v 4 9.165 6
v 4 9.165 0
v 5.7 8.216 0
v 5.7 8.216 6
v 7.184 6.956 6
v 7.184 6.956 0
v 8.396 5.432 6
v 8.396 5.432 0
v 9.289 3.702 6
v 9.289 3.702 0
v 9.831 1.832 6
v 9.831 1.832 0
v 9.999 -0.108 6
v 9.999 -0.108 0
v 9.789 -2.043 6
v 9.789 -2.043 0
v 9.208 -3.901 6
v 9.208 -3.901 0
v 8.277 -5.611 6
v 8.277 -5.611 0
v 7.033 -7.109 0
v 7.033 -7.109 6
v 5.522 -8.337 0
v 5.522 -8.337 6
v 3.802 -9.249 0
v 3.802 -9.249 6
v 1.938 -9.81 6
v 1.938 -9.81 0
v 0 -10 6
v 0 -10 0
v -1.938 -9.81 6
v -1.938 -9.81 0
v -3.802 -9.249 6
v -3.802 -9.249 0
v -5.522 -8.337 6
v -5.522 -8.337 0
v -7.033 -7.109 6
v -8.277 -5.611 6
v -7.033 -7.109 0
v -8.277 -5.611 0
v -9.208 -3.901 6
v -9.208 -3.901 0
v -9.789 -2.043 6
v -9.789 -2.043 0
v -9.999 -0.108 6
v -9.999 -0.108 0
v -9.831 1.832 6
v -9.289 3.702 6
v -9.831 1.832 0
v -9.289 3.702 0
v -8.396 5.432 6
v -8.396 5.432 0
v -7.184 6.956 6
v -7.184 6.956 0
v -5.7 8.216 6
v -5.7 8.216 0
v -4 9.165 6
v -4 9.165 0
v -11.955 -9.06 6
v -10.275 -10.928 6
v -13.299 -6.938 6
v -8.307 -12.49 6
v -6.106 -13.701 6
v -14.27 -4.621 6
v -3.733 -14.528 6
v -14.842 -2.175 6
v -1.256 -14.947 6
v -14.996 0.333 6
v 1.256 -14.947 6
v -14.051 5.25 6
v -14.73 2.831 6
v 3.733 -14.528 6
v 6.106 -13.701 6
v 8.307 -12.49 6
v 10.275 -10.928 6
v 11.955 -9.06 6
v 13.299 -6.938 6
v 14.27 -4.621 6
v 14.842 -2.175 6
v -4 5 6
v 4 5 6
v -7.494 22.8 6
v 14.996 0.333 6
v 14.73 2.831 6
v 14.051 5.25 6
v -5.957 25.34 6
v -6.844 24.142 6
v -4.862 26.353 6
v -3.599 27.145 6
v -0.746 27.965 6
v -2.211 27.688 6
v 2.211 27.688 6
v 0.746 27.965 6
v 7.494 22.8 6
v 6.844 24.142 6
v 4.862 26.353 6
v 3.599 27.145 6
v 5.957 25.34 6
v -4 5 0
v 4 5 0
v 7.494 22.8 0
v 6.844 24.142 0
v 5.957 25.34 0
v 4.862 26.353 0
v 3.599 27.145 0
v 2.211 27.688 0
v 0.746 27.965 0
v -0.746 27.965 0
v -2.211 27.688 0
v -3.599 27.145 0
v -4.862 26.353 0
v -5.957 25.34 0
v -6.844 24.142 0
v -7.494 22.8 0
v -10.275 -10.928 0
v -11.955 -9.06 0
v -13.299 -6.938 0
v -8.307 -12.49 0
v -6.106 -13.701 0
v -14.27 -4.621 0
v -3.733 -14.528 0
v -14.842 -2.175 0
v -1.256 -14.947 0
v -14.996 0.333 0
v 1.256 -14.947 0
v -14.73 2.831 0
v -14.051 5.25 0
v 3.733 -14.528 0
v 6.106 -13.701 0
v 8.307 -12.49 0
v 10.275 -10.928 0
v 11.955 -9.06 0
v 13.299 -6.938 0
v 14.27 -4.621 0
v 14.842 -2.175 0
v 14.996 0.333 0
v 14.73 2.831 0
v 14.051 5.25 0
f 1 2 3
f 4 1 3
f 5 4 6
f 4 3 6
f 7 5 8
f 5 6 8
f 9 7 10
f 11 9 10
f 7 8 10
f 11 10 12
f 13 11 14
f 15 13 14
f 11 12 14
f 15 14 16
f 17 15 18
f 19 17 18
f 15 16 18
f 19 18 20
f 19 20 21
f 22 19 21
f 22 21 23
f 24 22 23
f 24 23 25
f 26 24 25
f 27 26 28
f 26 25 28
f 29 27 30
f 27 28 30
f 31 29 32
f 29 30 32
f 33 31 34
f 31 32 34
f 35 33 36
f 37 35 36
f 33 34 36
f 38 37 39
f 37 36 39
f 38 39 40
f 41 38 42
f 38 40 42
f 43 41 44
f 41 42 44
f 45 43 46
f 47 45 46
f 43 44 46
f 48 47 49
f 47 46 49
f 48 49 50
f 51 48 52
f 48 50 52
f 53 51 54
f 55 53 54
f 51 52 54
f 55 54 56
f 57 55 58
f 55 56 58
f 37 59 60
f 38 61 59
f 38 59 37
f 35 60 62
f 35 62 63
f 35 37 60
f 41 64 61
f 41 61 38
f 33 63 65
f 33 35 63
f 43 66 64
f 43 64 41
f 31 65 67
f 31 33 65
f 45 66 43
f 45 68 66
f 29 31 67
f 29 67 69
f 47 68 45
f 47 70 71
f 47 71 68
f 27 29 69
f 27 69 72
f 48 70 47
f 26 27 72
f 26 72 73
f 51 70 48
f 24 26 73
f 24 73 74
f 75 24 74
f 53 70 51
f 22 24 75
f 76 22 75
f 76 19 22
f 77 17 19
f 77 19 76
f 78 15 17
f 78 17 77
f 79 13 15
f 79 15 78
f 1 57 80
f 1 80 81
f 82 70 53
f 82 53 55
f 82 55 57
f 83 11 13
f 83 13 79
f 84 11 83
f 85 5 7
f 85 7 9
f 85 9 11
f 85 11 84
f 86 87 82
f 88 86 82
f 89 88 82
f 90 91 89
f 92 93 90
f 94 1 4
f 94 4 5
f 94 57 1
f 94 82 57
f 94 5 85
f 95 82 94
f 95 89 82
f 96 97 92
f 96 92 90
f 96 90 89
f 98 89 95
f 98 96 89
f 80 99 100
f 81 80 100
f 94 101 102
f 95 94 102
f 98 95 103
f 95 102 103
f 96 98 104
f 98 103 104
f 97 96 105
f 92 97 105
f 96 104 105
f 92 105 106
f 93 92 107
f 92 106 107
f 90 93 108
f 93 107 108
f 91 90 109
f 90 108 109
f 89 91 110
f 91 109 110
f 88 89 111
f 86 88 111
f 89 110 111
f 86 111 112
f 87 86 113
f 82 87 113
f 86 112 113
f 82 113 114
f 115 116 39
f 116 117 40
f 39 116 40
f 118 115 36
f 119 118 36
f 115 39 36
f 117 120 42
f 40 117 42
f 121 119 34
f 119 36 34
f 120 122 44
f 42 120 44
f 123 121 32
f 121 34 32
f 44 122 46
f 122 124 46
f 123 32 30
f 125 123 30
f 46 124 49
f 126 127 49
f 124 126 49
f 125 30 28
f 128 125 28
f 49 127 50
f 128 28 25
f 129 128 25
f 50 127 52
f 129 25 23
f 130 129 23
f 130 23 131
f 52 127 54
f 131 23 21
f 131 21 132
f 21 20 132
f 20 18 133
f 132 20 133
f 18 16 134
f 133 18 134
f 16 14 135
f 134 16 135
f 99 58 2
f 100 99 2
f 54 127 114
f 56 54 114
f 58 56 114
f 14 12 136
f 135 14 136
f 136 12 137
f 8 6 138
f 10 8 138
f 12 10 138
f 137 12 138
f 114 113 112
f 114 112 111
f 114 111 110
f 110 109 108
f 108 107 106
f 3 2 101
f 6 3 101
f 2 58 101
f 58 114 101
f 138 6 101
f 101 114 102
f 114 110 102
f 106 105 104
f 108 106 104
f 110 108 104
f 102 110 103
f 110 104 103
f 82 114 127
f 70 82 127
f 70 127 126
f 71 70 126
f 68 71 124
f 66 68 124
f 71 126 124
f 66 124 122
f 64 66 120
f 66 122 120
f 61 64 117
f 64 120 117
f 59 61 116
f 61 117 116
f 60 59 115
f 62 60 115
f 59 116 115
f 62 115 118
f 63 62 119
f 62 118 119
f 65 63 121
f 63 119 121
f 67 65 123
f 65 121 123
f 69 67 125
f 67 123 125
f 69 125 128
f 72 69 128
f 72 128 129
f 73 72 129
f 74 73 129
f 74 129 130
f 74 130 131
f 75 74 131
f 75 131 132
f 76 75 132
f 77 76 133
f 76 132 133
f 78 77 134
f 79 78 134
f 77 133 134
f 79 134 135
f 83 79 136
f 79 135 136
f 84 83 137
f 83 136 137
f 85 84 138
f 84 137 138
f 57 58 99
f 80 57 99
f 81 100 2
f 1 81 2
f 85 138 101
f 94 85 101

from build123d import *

# Parameters (mm, degrees)
BOSS_EXTRUDE1_DEPTH = 6


with BuildPart() as part:
    # Sketch1 → Boss-Extrude1 (new body)
    with BuildSketch(Plane.XY):
        with BuildLine():
            ThreePointArc((7.493997598, 22.8), (0, 28), (-7.493997598, 22.8))
            Line((-7.493997598, 22.8), (-14.051245496, 5.25))
            ThreePointArc((-14.051245496, 5.25), (0, -15), (14.051245496, 5.25))
            Line((14.051245496, 5.25), (7.493997598, 22.8))
        make_face()
        with BuildLine():
            Line((-4, 9.16515139), (-4, 5))
            Line((-4, 5), (4, 5))
            Line((4, 5), (4, 9.16515139))
            ThreePointArc((4, 9.16515139), (0, -10), (-4, 9.16515139))
        make_face(mode=Mode.SUBTRACT)
    extrude(amount=BOSS_EXTRUDE1_DEPTH)


solid = part.part
